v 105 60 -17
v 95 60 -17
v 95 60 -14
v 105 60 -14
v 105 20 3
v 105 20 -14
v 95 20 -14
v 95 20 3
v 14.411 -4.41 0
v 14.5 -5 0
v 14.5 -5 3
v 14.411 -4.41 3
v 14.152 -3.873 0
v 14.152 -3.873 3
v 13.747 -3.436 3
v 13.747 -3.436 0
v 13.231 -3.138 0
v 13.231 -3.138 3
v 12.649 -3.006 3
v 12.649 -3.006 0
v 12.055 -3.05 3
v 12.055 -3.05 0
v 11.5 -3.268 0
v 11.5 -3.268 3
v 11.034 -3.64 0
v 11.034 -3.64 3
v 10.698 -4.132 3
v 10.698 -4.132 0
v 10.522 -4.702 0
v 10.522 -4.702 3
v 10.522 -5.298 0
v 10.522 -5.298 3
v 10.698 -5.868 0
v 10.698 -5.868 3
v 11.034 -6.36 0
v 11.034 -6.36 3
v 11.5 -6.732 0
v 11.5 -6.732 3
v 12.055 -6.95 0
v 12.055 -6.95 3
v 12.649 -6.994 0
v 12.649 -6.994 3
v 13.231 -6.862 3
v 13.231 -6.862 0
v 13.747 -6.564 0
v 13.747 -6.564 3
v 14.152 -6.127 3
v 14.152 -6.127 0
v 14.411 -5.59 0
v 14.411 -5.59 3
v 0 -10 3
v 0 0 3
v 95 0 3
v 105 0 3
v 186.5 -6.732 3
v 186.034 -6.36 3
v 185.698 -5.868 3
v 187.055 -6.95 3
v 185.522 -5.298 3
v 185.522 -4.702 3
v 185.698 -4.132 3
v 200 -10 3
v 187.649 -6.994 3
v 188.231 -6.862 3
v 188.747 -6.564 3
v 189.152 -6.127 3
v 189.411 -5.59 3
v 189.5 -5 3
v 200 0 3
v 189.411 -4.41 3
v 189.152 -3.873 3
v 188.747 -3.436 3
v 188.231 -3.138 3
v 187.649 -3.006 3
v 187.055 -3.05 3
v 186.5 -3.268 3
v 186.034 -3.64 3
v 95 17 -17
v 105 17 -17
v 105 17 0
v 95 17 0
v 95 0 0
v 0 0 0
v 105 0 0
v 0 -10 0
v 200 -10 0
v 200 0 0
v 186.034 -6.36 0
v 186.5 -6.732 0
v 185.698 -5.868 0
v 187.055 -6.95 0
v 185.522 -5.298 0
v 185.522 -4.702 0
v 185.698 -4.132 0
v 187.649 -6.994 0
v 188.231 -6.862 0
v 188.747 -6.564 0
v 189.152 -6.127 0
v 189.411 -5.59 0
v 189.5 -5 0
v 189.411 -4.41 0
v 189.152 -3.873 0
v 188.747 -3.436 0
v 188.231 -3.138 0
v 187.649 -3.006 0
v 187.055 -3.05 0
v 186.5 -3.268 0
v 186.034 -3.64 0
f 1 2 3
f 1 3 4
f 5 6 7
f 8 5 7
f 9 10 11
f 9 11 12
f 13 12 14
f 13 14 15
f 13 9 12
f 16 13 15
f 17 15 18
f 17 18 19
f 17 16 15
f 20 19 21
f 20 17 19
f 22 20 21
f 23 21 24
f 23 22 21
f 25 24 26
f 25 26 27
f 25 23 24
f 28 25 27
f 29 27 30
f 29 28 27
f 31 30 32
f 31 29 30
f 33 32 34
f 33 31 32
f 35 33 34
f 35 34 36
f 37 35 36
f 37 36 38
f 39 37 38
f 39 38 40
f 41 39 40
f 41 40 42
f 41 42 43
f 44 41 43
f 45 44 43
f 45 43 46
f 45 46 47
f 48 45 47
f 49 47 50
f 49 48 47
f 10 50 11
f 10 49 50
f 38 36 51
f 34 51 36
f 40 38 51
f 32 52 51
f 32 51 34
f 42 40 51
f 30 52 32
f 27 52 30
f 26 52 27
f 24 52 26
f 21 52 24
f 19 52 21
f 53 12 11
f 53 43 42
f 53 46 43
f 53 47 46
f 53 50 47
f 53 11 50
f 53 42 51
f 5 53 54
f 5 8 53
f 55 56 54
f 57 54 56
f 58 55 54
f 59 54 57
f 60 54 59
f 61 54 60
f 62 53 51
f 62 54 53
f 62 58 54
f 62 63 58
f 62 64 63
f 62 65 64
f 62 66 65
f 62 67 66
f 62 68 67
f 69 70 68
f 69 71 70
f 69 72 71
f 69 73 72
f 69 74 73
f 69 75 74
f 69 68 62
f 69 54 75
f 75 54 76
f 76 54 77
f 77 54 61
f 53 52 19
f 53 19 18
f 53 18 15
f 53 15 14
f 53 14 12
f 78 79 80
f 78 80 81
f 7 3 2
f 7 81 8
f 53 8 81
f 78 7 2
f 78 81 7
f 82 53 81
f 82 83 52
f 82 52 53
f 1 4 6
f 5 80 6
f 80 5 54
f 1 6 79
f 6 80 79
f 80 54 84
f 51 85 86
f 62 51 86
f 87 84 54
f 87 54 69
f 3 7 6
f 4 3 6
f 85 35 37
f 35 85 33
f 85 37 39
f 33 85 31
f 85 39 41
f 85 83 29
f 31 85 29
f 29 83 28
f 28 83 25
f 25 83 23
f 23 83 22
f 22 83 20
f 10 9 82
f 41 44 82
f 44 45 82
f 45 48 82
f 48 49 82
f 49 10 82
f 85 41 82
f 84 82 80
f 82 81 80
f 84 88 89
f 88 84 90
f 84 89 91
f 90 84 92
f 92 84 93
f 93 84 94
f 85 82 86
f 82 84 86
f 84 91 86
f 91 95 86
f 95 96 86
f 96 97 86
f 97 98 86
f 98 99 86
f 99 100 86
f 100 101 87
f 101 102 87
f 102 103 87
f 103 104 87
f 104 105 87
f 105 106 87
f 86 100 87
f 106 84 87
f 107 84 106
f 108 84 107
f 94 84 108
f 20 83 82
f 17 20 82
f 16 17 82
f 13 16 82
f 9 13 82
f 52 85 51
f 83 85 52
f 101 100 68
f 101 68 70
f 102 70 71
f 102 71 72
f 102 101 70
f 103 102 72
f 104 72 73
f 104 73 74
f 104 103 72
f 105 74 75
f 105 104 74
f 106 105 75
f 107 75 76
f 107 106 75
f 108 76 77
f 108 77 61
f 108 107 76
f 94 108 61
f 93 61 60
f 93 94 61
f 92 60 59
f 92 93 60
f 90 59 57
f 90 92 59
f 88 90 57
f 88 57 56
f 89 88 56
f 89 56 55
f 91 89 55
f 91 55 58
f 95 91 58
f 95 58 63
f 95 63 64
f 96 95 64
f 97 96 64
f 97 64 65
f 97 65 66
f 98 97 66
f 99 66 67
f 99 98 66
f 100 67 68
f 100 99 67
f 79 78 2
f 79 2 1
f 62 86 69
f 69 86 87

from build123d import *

# Parameters (mm, degrees)
SKETCH1_W           = 200
SKETCH1_H           = 10
SKETCH1_R           = 2
BOSS_EXTRUDE1_DEPTH = 3
SKETCH2_W           = 10
SKETCH2_H           = 20
BOSS_EXTRUDE2_DEPTH = 3
SKETCH3_W           = 10
SKETCH3_H           = 3
BOSS_EXTRUDE3_DEPTH = 17
SKETCH4_W           = 10
SKETCH4_H           = 3
BOSS_EXTRUDE4_DEPTH = 40


with BuildPart() as part:
    # Sketch1 → Boss-Extrude1 (new body)
    with BuildSketch(Plane.XY):
        with Locations((100, -5)):
            Rectangle(SKETCH1_W, SKETCH1_H)
        with Locations((12.5, -5)):
            Circle(SKETCH1_R, mode=Mode.SUBTRACT)
        with Locations((187.5, -5)):
            Circle(SKETCH1_R, mode=Mode.SUBTRACT)
    extrude(amount=BOSS_EXTRUDE1_DEPTH)

    # Sketch2 → Boss-Extrude2 (add)
    with BuildSketch(Plane.XY.offset(3)):
        with Locations((100, 10)):
            Rectangle(SKETCH2_W, SKETCH2_H)
    extrude(amount=-BOSS_EXTRUDE2_DEPTH)

    # Sketch3 → Boss-Extrude3 (add)
    with BuildSketch(Plane(origin=(0, 0, 0), x_dir=(-1, 0, 0), z_dir=(0, 0, -1))):
        with Locations((-100, 18.5)):
            Rectangle(SKETCH3_W, SKETCH3_H)
    extrude(amount=BOSS_EXTRUDE3_DEPTH)

    # Sketch4 → Boss-Extrude4 (add)
    with BuildSketch(Plane(origin=(0, 20, 0), x_dir=(1, 0, 0), z_dir=(0, 1, 0))):
        with Locations((100, 15.5)):
            Rectangle(SKETCH4_W, SKETCH4_H)
    extrude(amount=BOSS_EXTRUDE4_DEPTH)


solid = part.part
